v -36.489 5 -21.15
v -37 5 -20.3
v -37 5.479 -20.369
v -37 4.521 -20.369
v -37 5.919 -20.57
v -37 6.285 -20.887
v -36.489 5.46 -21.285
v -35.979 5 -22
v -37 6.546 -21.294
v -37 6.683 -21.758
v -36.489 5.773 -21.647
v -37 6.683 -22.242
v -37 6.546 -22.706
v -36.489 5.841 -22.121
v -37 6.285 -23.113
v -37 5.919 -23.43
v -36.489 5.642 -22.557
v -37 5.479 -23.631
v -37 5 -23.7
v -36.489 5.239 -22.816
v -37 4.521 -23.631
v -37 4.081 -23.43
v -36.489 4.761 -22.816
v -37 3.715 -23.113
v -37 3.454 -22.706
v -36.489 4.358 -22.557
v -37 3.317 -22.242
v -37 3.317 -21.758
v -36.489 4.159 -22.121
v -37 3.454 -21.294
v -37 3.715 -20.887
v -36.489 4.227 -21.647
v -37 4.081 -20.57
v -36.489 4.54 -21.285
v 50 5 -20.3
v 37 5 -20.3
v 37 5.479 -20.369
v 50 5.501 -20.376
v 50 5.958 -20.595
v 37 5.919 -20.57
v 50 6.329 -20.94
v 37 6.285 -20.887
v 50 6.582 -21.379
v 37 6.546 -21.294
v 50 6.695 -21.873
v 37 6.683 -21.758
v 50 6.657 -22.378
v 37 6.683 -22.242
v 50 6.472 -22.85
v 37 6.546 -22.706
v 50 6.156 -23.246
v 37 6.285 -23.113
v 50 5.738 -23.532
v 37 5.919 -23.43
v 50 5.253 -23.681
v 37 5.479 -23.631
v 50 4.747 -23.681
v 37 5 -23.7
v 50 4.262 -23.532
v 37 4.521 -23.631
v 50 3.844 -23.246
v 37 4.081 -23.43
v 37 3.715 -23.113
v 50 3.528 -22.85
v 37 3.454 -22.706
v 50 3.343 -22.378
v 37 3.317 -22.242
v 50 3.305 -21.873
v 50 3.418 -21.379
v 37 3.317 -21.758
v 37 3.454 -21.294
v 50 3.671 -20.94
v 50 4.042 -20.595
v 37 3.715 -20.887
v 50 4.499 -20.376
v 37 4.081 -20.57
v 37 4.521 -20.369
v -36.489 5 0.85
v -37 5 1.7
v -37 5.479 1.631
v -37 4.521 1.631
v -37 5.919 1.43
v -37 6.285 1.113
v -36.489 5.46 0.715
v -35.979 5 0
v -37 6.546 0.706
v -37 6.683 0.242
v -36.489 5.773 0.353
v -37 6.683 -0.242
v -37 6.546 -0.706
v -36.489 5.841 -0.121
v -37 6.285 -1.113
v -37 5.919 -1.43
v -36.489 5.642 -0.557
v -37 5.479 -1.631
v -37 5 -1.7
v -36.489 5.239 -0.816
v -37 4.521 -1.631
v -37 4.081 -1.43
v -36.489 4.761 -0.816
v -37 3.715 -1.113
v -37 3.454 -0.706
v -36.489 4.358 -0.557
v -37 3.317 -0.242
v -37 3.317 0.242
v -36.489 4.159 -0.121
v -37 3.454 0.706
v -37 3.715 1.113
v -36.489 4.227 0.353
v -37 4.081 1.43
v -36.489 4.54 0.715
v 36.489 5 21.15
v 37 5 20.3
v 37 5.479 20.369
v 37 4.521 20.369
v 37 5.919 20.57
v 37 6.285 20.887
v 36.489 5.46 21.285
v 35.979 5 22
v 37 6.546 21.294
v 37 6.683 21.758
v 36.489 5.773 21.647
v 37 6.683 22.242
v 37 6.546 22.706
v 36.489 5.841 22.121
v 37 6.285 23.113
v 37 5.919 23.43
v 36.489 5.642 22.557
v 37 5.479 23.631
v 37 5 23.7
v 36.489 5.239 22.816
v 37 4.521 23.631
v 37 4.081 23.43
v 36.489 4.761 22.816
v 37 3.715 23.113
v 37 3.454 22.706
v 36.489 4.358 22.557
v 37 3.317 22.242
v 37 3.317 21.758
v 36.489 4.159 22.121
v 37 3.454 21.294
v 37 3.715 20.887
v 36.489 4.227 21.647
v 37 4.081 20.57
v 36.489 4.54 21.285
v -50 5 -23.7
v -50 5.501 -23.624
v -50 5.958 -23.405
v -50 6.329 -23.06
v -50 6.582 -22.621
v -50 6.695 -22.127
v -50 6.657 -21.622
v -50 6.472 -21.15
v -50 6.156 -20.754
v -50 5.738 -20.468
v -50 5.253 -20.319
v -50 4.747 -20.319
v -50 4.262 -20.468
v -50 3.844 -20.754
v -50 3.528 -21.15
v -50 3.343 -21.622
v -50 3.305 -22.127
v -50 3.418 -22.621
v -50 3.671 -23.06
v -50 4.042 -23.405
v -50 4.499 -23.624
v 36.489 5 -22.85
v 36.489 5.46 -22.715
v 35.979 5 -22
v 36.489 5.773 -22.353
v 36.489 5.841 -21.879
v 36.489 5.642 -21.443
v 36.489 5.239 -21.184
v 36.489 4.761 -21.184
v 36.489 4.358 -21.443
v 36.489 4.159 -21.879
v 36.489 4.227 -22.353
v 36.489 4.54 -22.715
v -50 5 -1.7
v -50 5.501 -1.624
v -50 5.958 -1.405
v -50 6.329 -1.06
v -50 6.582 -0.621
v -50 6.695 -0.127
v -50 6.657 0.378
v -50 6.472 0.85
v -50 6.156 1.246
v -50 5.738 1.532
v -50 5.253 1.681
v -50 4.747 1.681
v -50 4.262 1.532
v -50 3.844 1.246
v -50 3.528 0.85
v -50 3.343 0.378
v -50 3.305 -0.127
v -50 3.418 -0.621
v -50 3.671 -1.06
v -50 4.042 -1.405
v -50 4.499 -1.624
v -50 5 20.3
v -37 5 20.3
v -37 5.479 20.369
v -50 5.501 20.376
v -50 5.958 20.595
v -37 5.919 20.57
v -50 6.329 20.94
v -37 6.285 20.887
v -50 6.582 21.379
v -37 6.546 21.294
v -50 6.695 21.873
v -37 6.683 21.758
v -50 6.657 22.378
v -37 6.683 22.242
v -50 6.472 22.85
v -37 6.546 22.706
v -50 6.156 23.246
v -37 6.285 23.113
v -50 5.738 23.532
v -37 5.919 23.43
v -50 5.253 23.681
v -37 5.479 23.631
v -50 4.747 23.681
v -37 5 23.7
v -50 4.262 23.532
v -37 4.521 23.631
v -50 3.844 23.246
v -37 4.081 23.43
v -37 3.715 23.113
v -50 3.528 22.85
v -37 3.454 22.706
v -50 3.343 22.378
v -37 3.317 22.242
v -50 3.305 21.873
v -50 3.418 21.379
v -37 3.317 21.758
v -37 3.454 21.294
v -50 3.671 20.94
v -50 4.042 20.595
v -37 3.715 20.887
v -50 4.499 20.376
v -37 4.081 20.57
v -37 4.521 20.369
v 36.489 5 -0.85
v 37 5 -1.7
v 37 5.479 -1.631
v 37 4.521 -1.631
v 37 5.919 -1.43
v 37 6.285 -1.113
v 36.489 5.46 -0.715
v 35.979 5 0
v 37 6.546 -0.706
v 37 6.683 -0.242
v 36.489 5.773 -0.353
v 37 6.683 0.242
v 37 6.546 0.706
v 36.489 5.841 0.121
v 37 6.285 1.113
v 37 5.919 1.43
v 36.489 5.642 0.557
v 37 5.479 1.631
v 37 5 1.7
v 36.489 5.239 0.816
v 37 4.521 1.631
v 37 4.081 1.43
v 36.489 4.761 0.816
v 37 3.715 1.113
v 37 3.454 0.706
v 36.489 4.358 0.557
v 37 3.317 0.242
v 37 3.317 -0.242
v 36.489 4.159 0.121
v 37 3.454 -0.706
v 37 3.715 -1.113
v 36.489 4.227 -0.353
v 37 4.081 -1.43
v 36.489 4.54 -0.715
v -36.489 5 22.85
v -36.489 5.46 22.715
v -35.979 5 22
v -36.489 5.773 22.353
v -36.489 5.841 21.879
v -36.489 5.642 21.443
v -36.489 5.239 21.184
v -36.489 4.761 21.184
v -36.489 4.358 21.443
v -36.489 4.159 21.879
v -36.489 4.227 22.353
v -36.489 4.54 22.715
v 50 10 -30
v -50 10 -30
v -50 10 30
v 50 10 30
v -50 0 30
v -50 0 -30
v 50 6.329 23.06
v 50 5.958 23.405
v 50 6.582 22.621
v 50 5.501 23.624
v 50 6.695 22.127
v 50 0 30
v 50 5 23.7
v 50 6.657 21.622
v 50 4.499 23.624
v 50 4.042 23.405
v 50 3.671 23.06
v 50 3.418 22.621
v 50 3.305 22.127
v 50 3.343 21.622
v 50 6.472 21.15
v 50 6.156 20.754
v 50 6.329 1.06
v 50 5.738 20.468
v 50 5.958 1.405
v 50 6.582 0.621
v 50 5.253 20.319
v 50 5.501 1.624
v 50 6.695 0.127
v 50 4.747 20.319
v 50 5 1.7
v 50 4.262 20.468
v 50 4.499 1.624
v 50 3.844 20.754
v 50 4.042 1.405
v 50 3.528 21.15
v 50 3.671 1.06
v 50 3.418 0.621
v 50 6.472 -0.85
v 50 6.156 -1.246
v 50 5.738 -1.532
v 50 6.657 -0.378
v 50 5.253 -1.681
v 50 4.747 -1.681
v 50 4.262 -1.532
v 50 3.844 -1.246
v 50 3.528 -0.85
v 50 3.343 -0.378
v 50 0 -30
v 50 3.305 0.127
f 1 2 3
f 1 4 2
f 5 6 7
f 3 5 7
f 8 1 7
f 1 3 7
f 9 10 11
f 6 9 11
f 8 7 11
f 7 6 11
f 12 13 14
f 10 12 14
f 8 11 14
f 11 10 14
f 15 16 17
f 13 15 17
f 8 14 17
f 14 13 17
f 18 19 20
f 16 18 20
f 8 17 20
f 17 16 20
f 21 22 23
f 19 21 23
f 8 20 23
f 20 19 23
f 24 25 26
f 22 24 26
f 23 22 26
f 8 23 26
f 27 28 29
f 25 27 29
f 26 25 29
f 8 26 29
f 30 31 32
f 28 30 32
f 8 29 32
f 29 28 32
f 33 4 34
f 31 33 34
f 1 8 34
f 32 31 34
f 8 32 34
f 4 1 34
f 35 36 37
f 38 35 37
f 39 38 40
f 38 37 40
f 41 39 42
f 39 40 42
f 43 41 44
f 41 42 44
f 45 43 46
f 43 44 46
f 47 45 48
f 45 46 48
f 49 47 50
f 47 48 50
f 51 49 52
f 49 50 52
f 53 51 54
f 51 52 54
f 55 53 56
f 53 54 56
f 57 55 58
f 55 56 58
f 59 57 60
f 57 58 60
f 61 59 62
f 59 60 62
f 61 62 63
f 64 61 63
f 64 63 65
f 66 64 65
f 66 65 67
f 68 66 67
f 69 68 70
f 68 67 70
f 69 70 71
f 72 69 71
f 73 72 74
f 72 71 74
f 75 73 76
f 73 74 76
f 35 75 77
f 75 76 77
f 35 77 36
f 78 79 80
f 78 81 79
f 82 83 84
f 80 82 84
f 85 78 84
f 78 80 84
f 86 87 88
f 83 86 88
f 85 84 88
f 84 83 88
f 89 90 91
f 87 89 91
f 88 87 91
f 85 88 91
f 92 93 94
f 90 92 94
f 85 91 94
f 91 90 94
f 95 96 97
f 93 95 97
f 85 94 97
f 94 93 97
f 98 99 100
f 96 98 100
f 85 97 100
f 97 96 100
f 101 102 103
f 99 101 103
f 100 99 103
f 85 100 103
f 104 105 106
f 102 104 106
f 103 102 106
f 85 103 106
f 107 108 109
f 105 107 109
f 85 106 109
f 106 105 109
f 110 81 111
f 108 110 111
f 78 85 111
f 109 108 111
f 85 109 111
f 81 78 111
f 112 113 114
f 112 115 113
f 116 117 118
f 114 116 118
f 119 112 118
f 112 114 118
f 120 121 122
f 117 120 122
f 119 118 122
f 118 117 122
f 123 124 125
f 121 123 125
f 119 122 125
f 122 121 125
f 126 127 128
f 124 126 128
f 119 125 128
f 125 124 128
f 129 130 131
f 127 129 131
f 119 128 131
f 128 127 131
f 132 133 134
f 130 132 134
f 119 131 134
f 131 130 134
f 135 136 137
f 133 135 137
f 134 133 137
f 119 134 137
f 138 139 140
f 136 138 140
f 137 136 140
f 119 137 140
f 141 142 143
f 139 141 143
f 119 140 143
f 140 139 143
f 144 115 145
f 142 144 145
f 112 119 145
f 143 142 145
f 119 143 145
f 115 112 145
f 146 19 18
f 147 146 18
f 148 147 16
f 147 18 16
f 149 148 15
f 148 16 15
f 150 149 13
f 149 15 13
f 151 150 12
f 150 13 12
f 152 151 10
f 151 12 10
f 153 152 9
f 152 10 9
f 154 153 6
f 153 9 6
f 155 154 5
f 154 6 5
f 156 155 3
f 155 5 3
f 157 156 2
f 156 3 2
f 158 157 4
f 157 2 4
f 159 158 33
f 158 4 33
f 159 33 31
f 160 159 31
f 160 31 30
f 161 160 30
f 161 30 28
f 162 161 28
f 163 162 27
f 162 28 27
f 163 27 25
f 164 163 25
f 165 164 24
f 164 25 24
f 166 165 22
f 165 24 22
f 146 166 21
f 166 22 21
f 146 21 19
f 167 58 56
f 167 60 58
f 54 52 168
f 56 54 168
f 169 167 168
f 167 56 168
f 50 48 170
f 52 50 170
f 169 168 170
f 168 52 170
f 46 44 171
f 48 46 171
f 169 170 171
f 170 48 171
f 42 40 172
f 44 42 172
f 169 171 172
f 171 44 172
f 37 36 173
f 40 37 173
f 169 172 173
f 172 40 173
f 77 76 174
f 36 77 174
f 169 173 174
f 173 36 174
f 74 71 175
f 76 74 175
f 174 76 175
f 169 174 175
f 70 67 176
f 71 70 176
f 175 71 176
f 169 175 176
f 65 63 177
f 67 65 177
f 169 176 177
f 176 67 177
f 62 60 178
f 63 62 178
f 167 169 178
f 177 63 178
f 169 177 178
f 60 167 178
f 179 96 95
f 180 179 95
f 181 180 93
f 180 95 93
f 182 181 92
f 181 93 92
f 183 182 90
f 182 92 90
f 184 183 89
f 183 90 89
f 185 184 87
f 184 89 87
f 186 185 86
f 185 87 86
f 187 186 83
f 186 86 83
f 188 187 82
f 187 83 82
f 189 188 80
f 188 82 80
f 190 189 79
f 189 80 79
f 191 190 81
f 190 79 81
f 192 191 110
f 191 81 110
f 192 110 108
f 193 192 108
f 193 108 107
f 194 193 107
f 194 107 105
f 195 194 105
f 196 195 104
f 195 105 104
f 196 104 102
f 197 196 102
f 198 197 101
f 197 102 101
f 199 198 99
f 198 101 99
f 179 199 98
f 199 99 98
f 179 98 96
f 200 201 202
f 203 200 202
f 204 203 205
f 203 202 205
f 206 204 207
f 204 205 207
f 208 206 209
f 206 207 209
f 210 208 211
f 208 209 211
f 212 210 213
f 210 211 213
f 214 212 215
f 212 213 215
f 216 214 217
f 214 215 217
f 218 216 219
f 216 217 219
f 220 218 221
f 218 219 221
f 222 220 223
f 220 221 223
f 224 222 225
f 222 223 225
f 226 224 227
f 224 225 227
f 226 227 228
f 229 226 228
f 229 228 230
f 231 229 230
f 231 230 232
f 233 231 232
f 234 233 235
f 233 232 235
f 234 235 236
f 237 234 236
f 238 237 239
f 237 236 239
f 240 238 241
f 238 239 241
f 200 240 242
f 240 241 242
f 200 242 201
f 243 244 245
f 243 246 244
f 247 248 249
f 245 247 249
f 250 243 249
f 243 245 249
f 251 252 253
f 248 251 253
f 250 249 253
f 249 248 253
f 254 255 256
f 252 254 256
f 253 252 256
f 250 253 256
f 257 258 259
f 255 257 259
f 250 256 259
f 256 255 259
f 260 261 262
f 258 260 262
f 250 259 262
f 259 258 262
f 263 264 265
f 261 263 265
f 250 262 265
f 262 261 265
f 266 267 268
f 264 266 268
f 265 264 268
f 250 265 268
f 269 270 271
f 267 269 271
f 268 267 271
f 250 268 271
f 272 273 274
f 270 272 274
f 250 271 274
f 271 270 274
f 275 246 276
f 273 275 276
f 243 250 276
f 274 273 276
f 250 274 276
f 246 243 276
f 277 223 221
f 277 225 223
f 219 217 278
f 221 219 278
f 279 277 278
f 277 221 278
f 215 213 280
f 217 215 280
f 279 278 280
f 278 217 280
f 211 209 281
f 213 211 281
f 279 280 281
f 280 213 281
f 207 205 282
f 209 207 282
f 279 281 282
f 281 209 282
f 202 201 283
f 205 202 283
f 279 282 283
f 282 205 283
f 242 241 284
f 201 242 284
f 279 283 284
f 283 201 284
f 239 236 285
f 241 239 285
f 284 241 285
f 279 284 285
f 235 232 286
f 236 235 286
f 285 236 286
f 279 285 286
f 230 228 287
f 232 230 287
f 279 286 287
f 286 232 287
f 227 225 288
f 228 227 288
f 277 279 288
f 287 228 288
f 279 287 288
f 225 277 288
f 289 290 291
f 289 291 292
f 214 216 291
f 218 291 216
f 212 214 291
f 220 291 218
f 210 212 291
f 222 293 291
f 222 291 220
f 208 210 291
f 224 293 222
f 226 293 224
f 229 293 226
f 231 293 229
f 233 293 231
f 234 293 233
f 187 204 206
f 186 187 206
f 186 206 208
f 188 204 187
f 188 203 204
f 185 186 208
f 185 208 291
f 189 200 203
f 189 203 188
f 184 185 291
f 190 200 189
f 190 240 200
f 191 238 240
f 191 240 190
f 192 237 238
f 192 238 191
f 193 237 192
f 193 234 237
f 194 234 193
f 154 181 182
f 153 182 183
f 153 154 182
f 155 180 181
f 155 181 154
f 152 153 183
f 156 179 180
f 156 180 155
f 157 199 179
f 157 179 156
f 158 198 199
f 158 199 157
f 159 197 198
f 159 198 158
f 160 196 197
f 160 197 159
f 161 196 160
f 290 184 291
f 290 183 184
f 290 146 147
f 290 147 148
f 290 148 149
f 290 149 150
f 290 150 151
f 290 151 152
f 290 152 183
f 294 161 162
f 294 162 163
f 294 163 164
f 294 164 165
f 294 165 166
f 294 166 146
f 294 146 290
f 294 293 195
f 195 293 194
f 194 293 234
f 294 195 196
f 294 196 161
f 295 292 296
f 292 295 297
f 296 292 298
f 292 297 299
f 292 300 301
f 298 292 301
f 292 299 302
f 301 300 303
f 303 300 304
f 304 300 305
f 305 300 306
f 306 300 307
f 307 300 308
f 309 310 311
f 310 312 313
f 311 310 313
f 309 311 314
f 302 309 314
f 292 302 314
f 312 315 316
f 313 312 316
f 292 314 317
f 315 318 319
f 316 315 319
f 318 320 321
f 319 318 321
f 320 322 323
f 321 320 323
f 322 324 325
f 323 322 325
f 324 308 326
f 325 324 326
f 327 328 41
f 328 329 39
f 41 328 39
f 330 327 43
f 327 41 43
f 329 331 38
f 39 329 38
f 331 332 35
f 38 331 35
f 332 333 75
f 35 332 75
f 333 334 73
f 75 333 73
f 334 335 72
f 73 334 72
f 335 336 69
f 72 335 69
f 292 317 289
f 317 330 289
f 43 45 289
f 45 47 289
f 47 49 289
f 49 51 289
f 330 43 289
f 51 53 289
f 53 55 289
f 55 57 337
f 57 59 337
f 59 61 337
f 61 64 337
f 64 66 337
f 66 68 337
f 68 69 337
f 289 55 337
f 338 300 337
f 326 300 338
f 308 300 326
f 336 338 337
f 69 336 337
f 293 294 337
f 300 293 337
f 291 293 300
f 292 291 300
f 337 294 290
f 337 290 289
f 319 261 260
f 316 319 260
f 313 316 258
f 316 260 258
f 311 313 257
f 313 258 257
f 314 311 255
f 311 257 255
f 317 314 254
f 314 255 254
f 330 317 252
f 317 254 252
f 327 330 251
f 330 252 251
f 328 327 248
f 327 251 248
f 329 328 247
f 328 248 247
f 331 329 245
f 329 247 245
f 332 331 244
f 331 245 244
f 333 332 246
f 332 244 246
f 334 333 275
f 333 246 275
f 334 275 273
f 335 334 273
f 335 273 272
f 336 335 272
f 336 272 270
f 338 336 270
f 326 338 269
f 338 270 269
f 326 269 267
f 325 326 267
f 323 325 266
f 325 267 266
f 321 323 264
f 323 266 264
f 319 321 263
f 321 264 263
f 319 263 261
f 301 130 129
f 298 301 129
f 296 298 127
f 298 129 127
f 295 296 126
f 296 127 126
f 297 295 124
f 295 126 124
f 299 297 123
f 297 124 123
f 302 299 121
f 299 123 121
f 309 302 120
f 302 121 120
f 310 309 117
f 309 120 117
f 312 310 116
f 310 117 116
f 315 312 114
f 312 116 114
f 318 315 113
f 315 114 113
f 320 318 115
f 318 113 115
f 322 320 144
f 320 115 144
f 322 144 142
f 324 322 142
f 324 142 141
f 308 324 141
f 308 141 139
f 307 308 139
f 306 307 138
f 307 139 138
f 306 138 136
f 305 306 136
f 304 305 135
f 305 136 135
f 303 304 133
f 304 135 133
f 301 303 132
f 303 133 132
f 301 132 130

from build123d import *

# Parameters (mm, degrees)
SKETCH1_W                      = 100
SKETCH1_H                      = 60
BOSS_EXTRUDE1_DEPTH            = 10
CBORE_FOR_M3_SHCS1_D           = 3.4
CBORE_FOR_M3_SHCS1_DEPTH       = 23
CBORE_FOR_M3_SHCS1_CBORE_D     = 6.5
CBORE_FOR_M3_SHCS1_CBORE_DEPTH = 3
CBORE_FOR_M3_SHCS1_TIP         = 1.021463052
CBORE_FOR_M3_SHCS2_D           = 3.4
CBORE_FOR_M3_SHCS2_DEPTH       = 23
CBORE_FOR_M3_SHCS2_CBORE_D     = 6.5
CBORE_FOR_M3_SHCS2_CBORE_DEPTH = 3
CBORE_FOR_M3_SHCS2_TIP         = 1.021463052


with BuildPart() as part:
    # Sketch1 → Boss-Extrude1 (new body)
    with BuildSketch(Plane(origin=(0, 0, 0), x_dir=(1, 0, 0), z_dir=(0, 1, 0))):
        Rectangle(SKETCH1_W, SKETCH1_H)
    extrude(amount=BOSS_EXTRUDE1_DEPTH)

    # CBORE for M3 SHCS1
    with Locations(Plane(origin=(60, -888.012147263, -1303.282701689), x_dir=(0, 0, -1), z_dir=(1, 0, 0))):
        with Locations((-1281.282701689, 893.012147263), (-1325.282701689, 893.012147263), (-1303.282701689, 893.012147263)):
            CounterBoreHole(CBORE_FOR_M3_SHCS1_D / 2, CBORE_FOR_M3_SHCS1_CBORE_D / 2, CBORE_FOR_M3_SHCS1_CBORE_DEPTH, depth=CBORE_FOR_M3_SHCS1_DEPTH)
            with Locations((0, 0, -(CBORE_FOR_M3_SHCS1_DEPTH + CBORE_FOR_M3_SHCS1_TIP / 2))):  # 118° drill point
                Cone(0, CBORE_FOR_M3_SHCS1_D / 2, CBORE_FOR_M3_SHCS1_TIP, mode=Mode.SUBTRACT)

    # CBORE for M3 SHCS2
    with Locations(Plane(origin=(-60, -888.012147263, -1303.282701689), x_dir=(0, 0, 1), z_dir=(-1, 0, 0))):
        with Locations((1281.282701689, 893.012147263), (1325.282701689, 893.012147263), (1303.282701689, 893.012147263)):
            CounterBoreHole(CBORE_FOR_M3_SHCS2_D / 2, CBORE_FOR_M3_SHCS2_CBORE_D / 2, CBORE_FOR_M3_SHCS2_CBORE_DEPTH, depth=CBORE_FOR_M3_SHCS2_DEPTH)
            with Locations((0, 0, -(CBORE_FOR_M3_SHCS2_DEPTH + CBORE_FOR_M3_SHCS2_TIP / 2))):  # 118° drill point
                Cone(0, CBORE_FOR_M3_SHCS2_D / 2, CBORE_FOR_M3_SHCS2_TIP, mode=Mode.SUBTRACT)


solid = part.part
